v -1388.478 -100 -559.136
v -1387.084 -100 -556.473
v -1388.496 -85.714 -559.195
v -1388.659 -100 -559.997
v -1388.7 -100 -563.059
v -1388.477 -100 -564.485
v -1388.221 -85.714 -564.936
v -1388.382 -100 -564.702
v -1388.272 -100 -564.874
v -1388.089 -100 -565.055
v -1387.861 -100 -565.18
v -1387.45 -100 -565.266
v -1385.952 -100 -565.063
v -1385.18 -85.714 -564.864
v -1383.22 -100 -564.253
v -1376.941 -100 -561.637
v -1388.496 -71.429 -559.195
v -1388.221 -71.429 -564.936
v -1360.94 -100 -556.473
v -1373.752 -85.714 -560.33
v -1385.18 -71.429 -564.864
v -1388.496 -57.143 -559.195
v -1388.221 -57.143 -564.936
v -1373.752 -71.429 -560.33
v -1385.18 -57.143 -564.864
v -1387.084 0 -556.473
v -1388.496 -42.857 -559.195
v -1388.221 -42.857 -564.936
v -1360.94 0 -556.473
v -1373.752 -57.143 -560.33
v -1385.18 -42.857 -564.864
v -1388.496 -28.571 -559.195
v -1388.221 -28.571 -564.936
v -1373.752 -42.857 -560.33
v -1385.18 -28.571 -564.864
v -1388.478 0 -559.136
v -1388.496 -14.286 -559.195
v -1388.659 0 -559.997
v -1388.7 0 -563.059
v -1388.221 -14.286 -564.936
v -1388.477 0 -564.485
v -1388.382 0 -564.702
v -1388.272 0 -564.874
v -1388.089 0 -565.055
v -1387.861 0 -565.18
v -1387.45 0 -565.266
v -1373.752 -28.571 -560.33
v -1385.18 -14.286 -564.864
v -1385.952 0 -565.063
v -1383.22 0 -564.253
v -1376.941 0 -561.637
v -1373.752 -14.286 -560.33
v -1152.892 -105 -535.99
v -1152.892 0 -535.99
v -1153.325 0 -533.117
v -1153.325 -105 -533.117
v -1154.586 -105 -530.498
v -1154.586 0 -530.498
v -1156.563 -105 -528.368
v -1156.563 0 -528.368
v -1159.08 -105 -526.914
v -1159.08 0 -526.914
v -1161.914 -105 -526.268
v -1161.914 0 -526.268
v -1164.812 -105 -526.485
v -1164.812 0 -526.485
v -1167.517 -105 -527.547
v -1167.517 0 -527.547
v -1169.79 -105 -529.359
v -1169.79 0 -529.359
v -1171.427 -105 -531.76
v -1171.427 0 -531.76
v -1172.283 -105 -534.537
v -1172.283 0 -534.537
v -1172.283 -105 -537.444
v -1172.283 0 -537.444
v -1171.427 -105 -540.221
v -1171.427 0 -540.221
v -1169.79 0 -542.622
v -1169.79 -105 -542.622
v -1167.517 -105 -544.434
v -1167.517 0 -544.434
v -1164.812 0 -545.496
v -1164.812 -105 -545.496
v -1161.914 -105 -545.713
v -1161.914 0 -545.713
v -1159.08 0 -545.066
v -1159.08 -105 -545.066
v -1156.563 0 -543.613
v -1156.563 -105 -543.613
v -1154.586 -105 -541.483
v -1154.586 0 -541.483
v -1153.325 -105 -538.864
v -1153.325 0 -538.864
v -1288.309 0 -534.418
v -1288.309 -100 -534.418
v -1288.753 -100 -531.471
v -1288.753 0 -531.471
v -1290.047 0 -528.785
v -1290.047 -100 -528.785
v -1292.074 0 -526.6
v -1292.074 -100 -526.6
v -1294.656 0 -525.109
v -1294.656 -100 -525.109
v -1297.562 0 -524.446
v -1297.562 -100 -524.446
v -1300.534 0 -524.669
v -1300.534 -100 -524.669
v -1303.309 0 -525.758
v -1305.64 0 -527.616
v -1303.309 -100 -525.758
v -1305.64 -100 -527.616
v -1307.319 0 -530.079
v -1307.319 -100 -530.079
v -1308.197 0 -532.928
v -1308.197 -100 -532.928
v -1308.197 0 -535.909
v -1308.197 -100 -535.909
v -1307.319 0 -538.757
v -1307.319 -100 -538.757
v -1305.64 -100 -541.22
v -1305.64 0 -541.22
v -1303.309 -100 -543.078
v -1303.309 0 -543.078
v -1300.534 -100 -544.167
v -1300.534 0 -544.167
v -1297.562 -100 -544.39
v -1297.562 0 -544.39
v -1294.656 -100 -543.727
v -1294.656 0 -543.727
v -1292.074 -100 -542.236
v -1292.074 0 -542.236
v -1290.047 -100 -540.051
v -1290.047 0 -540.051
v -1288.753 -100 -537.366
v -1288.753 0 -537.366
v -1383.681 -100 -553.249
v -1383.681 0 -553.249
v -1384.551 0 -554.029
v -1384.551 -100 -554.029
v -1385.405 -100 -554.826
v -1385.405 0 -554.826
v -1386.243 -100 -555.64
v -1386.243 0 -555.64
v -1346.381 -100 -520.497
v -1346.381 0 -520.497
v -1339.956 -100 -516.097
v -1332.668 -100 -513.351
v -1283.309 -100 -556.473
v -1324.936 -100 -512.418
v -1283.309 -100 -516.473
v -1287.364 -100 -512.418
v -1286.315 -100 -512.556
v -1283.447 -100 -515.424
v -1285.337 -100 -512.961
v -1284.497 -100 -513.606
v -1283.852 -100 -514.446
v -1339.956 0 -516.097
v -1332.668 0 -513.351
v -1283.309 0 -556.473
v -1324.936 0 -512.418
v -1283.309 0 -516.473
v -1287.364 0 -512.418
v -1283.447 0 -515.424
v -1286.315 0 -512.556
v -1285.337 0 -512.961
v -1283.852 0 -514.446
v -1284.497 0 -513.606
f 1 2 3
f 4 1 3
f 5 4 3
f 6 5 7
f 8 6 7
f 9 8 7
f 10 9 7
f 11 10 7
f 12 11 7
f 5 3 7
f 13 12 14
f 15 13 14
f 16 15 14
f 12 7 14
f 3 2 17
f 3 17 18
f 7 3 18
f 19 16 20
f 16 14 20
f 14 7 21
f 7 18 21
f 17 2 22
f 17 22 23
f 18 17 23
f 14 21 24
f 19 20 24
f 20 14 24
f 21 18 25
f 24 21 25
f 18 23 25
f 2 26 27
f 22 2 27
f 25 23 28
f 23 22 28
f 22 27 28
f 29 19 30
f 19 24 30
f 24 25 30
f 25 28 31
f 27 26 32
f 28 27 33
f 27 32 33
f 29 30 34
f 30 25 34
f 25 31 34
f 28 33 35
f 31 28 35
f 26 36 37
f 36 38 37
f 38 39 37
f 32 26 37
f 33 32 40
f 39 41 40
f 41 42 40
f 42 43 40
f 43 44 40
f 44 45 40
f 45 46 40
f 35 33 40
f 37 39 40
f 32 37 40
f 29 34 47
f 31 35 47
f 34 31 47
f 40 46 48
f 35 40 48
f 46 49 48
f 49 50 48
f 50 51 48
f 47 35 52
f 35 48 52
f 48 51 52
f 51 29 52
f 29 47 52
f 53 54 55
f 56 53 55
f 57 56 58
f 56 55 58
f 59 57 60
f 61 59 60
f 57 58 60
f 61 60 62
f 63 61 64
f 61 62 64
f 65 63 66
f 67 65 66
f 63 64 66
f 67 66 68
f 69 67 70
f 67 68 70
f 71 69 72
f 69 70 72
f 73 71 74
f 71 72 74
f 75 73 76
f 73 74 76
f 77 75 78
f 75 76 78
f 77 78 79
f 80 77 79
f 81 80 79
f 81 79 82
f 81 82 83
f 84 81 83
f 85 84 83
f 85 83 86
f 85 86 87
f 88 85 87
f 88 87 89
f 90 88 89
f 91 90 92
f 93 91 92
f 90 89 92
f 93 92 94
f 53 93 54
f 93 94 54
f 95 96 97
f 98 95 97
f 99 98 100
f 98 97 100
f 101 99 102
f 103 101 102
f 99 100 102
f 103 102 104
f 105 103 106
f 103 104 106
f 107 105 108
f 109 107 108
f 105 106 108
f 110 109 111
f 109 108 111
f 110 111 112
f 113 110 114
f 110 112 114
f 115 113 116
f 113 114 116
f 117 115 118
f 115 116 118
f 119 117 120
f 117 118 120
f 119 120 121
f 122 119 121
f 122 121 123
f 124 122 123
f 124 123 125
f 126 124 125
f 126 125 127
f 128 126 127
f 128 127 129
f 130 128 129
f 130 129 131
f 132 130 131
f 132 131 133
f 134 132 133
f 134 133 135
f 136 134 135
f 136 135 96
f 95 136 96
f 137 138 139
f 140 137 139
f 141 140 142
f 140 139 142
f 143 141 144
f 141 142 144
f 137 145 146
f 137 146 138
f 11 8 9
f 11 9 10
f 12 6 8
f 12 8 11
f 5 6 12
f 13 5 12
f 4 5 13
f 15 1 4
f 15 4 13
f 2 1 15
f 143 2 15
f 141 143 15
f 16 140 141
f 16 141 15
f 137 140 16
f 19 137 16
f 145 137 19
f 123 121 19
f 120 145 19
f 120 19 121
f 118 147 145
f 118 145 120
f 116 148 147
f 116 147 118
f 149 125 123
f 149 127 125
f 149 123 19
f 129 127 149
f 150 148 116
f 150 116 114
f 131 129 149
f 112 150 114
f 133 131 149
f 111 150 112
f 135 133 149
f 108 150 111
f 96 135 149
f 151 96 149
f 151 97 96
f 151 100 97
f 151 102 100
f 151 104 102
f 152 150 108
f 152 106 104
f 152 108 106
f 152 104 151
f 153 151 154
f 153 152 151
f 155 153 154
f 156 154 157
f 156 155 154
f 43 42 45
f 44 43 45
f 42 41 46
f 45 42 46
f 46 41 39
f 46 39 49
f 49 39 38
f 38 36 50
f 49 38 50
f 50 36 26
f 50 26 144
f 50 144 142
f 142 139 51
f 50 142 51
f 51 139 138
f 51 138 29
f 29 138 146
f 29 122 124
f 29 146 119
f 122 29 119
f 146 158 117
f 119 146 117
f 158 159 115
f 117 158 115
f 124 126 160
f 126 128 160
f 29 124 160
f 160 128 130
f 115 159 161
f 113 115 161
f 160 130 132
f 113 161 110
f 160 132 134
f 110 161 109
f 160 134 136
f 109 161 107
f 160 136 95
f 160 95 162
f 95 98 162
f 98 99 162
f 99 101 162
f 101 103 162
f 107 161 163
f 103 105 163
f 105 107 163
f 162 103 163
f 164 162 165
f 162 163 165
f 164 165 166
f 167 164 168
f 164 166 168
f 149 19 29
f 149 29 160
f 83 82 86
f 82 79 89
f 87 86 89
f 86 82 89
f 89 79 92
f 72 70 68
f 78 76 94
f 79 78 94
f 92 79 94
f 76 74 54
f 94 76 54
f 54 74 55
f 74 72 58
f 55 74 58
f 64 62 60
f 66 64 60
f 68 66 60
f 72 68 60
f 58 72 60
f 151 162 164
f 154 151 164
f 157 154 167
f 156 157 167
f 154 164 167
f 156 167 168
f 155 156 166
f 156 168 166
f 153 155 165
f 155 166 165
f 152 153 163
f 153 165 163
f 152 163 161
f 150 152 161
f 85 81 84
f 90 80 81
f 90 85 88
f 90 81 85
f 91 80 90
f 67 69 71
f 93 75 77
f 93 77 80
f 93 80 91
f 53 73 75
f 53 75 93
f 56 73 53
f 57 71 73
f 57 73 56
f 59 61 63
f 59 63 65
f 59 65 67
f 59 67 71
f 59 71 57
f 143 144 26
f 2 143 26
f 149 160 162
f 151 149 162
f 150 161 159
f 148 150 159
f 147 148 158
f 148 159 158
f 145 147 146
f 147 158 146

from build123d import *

# Parameters (mm, degrees)
F1_DEPTH = 100
F2_R     = 10
F3_DEPTH = 200
F4_R     = 9.75
F5_DEPTH = 105


with BuildPart() as f1:
    # F0 (on Front) → F1 (new body)
    with BuildSketch(Plane.XZ):
        with BuildLine():
            Line((-1287.3642943979, -512.4181020195), (-1324.9364355903, -512.4181020195))
            ThreePointArc((-1324.9364355903, -512.4181020195), (-1336.394290745, -514.5047762171), (-1346.3808651818, -520.496853067))
            Line((-1346.3808651818, -520.496853067), (-1383.6805482123, -553.2489948482))
            ThreePointArc((-1383.6805482123, -553.2489948482), (-1384.9797824248, -554.4250767245), (-1386.2428762738, -555.6398903098))
            Line((-1386.2428762738, -555.6398903098), (-1387.0836972932, -556.4733992374))
            Line((-1387.0836972932, -556.4733992374), (-1360.9400987625, -556.4733992374))
            Line((-1360.9400987625, -556.4733992374), (-1283.3089971801, -556.4733992374))
            Line((-1283.3089971801, -556.4733992374), (-1283.3089971801, -516.4733992374))
            ThreePointArc((-1283.3089971801, -516.4733992374), (-1284.4967662355, -513.6058710749), (-1287.3642943979, -512.4181020195))
        make_face()
        with BuildLine():
            add(Edge.make_bspline(
                [(-1387.0836972932, -556.4733992374), (-1387.6599327637, -557.4008498398), (-1388.7610327475, -559.1730695237), (-1388.6798929257, -561.5553628145), (-1388.7877901056, -565.5831243314), (-1385.6390637514, -565.097373418), (-1380.6190888609, -563.4220024101), (-1373.6143452981, -559.9114625079), (-1365.5237906543, -557.7167885538), (-1360.9400987625, -556.4733992374)],
                knots=[0, 0, 0, 0, 0.1136746916, 0.2172153702, 0.334156119, 0.4316588403, 0.5808442599, 0.762527929, 1, 1, 1, 1], degree=3))
            Line((-1360.9400987625, -556.4733992374), (-1387.0836972932, -556.4733992374))
        make_face()
    extrude(amount=F1_DEPTH)

    # F2 (on face) → F3 (cut)
    with BuildSketch(Plane.XZ.offset(100)):
        with Locations((-1298.3089971801, -534.4181020195)):
            Circle(F2_R)
    extrude(amount=-F3_DEPTH, mode=Mode.SUBTRACT)


with BuildPart() as f5:
    # F4 (on Front) → F5 (new body)
    with BuildSketch(Plane.XZ):
        with Locations((-1162.6422676173, -535.9904806722)):
            Circle(F4_R)
    extrude(amount=F5_DEPTH)


solid = Compound([f1.part, f5.part])
